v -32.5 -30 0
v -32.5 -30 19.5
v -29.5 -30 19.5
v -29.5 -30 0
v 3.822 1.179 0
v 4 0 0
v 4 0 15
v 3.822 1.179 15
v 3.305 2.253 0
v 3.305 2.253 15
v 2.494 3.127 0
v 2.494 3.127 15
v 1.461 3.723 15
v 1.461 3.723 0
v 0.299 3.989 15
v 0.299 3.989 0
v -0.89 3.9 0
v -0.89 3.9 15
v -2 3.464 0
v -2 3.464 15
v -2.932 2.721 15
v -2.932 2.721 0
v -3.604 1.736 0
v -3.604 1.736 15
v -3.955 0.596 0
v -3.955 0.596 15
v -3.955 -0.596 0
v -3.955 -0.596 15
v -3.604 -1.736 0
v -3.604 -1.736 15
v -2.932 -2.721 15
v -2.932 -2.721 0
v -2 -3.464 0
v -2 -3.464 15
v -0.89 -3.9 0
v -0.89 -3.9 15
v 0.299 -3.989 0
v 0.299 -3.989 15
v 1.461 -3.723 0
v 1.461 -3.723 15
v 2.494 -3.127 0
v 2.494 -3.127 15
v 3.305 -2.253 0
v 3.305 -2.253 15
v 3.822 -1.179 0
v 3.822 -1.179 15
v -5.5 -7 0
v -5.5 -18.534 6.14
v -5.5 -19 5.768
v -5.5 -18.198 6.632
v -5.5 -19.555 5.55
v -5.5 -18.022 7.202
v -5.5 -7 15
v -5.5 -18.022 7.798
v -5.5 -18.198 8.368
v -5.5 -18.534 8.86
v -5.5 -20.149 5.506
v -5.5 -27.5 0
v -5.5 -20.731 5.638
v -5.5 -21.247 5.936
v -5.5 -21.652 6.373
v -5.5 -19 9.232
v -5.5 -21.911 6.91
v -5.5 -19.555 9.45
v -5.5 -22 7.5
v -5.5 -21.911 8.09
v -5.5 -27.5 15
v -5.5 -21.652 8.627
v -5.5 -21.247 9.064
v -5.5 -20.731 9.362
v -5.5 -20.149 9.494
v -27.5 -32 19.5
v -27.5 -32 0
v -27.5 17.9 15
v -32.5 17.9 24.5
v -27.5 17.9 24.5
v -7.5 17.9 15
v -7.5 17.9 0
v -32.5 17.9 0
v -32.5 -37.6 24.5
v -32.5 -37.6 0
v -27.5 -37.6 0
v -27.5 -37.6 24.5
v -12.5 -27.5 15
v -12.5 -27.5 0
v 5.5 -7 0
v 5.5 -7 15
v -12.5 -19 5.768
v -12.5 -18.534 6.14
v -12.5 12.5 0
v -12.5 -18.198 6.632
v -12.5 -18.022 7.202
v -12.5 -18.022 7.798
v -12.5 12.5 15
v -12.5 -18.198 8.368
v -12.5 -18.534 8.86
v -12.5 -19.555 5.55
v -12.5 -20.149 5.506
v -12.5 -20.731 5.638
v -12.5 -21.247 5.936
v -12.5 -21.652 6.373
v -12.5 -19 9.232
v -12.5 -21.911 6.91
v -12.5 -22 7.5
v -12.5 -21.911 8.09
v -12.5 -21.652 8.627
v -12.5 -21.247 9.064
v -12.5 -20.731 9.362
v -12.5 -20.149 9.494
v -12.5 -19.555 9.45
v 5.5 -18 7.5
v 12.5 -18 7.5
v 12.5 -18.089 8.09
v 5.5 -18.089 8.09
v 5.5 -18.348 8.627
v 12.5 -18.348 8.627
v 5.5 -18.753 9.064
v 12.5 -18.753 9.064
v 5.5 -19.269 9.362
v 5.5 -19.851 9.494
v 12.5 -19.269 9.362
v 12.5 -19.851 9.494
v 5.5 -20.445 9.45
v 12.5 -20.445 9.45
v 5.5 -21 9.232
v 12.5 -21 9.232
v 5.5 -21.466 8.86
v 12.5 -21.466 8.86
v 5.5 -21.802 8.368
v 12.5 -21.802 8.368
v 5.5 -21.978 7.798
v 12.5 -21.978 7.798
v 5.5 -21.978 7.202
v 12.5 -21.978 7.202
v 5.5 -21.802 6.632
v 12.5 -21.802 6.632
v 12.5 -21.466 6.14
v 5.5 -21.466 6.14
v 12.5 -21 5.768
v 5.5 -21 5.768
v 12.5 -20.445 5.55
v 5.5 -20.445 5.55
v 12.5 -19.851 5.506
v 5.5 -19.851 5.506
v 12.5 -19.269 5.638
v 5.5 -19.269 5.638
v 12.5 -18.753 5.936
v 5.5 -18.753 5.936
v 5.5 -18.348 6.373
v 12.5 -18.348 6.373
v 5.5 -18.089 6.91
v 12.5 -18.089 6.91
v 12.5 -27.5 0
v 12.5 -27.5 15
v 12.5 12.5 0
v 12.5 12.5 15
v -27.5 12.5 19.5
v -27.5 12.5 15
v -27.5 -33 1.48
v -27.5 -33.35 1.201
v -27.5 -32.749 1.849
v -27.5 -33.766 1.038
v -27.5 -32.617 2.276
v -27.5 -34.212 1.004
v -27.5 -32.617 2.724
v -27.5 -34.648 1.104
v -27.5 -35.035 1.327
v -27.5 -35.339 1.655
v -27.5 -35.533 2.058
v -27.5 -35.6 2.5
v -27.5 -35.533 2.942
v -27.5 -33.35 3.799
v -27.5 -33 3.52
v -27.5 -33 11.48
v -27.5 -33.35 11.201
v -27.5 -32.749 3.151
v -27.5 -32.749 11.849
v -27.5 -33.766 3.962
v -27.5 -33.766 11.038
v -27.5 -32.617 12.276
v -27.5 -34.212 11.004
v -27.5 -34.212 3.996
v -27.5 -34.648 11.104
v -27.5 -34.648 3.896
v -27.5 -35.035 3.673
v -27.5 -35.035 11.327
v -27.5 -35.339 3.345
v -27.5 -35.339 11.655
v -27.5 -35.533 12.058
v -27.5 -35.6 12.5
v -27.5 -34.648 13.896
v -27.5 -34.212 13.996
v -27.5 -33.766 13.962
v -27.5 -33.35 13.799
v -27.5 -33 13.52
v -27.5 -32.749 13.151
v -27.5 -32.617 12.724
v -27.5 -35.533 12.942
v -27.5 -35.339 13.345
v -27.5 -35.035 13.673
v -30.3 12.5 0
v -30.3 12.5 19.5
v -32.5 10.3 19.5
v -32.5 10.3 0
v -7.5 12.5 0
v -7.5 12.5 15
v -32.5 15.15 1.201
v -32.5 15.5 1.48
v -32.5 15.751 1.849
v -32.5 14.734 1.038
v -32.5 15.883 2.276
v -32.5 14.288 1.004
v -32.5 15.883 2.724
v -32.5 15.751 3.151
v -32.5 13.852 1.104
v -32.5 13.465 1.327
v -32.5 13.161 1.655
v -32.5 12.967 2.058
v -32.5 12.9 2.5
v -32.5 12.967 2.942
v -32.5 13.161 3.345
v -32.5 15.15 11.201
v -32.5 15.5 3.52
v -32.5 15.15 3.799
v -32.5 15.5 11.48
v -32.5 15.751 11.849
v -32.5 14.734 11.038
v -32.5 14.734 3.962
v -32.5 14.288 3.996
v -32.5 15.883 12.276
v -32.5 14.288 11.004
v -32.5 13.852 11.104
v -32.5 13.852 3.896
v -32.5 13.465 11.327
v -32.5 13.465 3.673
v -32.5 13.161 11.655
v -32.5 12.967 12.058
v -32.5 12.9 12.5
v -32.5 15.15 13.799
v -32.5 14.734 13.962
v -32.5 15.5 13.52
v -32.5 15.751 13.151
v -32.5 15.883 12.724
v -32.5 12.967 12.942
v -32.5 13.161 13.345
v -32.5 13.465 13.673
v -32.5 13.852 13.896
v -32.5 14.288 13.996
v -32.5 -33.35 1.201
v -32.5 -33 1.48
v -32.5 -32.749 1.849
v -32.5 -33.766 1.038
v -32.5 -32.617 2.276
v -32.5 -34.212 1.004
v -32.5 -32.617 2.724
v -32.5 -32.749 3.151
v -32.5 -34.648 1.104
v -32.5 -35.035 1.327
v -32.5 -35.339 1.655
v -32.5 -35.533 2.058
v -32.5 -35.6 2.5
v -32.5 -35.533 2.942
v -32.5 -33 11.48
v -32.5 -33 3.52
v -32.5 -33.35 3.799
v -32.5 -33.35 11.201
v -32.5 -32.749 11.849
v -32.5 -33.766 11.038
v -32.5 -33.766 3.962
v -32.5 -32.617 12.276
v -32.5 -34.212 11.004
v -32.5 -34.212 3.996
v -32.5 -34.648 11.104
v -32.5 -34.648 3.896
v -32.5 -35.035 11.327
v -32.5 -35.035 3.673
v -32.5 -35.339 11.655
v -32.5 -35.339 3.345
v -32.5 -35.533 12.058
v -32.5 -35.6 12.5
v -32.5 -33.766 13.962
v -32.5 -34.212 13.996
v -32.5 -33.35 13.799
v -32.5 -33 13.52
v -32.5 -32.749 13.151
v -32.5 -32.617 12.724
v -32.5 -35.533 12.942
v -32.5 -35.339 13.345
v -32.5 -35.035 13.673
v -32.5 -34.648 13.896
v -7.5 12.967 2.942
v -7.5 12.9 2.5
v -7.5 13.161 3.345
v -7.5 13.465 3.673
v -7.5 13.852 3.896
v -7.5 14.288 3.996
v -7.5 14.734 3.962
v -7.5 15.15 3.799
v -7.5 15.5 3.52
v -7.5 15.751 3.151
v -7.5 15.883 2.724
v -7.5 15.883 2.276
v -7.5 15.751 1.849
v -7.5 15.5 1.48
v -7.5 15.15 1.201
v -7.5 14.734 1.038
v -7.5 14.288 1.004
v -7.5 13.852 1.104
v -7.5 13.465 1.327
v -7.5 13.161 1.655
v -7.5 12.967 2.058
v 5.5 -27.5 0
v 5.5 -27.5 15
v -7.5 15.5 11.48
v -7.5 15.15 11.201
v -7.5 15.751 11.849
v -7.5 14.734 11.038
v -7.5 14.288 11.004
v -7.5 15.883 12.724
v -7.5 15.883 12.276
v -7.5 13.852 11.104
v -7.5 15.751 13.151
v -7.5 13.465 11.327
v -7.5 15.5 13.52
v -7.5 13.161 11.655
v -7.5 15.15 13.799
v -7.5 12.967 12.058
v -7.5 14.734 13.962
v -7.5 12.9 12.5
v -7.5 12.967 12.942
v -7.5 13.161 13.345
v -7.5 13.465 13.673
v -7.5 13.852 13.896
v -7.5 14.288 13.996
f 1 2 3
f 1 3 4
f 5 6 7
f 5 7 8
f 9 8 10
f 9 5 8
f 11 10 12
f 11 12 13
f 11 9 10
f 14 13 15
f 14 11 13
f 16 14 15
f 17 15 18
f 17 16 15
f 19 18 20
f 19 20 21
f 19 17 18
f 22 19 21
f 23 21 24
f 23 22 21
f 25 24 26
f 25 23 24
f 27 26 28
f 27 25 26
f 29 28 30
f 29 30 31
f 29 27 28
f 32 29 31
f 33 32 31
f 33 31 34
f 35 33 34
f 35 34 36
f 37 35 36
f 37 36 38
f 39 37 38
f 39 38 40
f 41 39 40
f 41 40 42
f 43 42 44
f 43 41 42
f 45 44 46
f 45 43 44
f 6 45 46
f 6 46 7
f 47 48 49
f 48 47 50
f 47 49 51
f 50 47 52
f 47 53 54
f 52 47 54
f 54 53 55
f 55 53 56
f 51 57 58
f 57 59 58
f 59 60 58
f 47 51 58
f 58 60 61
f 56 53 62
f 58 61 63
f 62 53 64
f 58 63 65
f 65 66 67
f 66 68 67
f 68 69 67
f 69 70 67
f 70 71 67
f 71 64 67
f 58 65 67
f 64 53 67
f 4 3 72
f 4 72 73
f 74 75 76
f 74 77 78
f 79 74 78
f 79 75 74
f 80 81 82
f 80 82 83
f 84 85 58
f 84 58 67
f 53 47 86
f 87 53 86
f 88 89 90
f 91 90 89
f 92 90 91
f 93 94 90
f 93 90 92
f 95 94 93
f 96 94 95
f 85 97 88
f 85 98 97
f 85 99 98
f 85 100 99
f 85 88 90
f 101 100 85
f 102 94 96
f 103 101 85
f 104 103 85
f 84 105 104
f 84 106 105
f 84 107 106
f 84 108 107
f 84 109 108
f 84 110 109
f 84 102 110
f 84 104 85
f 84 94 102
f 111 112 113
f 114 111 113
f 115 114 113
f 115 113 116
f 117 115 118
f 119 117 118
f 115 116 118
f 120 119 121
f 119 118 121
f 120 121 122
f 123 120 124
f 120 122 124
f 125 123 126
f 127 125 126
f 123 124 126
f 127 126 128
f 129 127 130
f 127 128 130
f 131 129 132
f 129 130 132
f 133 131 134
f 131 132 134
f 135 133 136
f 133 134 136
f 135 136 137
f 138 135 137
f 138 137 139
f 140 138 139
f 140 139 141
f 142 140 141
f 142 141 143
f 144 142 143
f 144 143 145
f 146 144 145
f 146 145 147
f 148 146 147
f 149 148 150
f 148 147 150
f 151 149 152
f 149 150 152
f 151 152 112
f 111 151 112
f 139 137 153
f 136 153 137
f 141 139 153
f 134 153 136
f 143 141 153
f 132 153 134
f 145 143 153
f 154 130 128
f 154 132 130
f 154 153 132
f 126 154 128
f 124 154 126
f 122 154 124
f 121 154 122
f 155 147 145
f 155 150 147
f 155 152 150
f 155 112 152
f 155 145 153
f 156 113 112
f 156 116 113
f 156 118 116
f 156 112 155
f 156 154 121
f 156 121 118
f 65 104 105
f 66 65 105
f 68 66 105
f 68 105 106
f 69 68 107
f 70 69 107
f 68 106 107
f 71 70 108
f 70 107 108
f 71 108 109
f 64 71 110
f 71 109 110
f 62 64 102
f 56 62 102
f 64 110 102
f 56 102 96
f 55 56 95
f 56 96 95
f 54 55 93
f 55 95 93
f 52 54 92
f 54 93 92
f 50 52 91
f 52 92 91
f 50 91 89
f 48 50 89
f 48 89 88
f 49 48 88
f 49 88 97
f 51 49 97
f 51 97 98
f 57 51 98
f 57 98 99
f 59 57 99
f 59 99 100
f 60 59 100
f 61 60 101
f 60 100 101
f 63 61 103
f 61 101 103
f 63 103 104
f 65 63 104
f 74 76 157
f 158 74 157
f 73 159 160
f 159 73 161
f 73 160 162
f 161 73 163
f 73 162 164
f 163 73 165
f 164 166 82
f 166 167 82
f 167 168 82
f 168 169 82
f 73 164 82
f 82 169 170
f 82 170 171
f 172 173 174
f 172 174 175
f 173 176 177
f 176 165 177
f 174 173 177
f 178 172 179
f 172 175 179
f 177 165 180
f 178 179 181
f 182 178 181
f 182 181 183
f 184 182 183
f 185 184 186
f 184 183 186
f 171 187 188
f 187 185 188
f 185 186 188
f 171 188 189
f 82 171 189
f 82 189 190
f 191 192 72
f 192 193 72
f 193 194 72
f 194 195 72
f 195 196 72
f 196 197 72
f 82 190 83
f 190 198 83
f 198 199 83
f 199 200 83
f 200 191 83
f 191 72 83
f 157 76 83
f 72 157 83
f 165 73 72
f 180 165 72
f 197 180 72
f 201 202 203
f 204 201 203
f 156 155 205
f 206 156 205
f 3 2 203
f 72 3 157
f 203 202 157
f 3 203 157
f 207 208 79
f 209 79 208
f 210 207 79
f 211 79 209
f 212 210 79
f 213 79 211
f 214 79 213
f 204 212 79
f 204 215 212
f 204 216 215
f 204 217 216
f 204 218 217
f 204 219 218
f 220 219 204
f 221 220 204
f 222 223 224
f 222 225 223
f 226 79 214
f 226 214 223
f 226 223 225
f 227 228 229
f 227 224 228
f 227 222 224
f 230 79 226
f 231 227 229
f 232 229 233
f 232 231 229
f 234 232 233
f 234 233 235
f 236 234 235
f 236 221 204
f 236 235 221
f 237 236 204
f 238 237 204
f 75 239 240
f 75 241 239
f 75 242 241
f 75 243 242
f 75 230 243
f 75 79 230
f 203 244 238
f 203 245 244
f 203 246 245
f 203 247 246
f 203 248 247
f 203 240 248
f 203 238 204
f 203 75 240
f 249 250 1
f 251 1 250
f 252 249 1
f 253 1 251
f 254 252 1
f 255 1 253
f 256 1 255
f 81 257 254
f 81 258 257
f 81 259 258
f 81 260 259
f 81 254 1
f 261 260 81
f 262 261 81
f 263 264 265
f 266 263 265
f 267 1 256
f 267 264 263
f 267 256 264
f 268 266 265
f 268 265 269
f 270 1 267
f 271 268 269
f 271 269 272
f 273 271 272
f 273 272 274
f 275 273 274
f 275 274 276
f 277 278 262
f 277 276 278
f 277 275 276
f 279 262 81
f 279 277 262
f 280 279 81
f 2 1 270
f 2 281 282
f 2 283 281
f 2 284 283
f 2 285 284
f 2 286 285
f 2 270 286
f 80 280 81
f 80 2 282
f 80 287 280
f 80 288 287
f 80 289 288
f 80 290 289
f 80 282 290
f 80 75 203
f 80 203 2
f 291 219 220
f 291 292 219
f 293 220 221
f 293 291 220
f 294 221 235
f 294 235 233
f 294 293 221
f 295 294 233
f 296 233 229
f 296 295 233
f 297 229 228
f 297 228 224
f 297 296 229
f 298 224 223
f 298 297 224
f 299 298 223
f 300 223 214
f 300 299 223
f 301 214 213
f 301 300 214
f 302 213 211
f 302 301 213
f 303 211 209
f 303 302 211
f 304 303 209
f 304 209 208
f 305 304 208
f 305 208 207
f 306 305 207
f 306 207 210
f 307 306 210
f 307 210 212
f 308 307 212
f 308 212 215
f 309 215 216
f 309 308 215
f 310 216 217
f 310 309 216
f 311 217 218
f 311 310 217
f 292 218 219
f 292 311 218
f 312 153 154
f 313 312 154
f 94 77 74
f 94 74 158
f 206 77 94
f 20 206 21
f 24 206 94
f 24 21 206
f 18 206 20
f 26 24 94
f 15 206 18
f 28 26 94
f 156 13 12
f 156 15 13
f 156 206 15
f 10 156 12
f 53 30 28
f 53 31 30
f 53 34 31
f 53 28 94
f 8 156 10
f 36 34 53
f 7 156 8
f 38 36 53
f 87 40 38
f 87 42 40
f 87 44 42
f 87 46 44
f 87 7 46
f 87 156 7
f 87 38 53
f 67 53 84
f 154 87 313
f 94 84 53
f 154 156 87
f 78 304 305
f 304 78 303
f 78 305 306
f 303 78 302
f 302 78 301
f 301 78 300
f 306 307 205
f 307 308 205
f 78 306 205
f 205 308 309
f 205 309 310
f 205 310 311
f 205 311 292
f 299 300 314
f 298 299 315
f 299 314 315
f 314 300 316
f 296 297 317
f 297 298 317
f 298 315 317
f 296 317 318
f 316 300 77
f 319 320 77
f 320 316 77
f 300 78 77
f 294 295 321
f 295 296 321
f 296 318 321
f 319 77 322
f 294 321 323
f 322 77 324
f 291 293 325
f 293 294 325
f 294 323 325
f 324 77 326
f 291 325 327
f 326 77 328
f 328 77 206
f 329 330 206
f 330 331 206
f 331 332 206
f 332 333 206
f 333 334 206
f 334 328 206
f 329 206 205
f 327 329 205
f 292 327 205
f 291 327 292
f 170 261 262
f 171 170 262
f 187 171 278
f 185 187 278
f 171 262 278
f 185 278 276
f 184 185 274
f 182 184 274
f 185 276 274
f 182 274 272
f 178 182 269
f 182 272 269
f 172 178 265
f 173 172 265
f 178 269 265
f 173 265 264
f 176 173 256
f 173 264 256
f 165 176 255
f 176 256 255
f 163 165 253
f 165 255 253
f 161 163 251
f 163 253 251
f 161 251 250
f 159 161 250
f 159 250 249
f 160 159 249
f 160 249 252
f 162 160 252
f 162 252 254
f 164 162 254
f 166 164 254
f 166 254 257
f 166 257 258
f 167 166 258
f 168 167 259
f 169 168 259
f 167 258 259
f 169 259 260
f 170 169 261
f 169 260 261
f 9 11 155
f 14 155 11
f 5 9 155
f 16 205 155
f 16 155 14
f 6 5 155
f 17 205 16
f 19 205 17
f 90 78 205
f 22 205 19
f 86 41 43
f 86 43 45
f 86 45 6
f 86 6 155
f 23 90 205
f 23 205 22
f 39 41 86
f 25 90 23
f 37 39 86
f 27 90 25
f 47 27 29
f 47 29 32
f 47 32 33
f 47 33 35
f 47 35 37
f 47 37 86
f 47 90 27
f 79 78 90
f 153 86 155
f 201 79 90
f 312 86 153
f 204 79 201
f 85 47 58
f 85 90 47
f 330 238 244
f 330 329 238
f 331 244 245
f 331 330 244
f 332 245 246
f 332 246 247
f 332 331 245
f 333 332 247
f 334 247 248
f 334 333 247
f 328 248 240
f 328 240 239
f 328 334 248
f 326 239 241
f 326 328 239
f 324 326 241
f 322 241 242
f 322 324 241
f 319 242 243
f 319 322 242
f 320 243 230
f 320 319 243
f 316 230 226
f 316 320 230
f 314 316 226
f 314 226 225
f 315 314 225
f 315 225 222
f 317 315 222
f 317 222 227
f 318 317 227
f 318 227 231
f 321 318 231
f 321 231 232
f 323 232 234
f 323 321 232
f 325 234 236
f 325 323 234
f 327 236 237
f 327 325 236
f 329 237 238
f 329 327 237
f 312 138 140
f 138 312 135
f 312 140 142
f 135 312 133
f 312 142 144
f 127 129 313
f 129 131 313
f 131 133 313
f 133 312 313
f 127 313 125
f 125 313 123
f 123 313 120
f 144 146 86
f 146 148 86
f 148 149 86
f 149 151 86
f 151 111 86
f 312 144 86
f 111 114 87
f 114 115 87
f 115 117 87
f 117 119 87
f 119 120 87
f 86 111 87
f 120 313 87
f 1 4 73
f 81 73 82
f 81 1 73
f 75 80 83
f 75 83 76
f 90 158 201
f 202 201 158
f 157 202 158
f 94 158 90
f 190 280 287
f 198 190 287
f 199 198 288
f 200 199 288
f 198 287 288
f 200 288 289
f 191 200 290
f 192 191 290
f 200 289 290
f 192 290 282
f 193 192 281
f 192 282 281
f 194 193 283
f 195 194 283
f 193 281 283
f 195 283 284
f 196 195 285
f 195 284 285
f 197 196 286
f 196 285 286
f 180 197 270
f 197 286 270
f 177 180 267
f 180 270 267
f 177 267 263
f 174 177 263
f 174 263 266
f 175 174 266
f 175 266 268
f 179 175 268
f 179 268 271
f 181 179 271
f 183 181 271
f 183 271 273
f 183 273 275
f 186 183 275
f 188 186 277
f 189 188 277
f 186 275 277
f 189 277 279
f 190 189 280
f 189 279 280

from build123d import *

# Parameters (mm, degrees)
F0_R         = 4
F1_DEPTH     = 15
F3_W         = 15
F3_H         = 15
F3_R         = 2
F4_DEPTH     = 7
F6_W         = 15
F6_H         = 15
F6_R         = 2
F7_DEPTH     = 7
F8_W         = 5.4
F8_H         = 15
F8_R         = 1.5
F9_DEPTH     = 5
F10_DEPTH    = 20
F12_W        = 5.4
F12_H        = 2.5
F12_W_2      = 7.6
F12_H_2      = 15
F12_R        = 1.5
F13_DEPTH    = 5
F12_W_3      = 2.2
F12_H_3      = 2
F14_DEPTH    = 3
F15_T4_DEPTH = 27.2150489639
F16_SIZE     = 2


# Not quite as in the source:
# - a fillet or chamfer that OpenCascade refuses, or shapes differently, is made with other operations: its cross-section is extruded or revolved along the edge and cut away or added


with BuildPart() as f1:
    # F0 (on Top) → F1 (new body)
    with BuildSketch(Plane.XY):
        Polygon((12.5, -12.5), (12.5, 12.5), (-12.5, 12.5), (-12.5, -12.5), (-5.5, -12.5), (-5.5, -7), (5.5, -7), (5.5, -12.5), align=None)
        Circle(F0_R, mode=Mode.SUBTRACT)
    extrude(amount=F1_DEPTH)

    # F3 (on offset) → F4 (join)
    with BuildSketch(Plane(origin=(-12.5, 0, 0), x_dir=(0, -1, 0), z_dir=(-1, 0, 0))):
        with Locations((20, 7.5)):
            Rectangle(F3_W, F3_H)
        with Locations((20, 7.5)):
            Circle(F3_R, mode=Mode.SUBTRACT)
    extrude(amount=-F4_DEPTH)

    # F6 (on offset) → F7 (join)
    with BuildSketch(Plane.YZ.offset(12.5)):
        with Locations((-20, 7.5)):
            Rectangle(F6_W, F6_H)
        with Locations((-20, 7.5)):
            Circle(F6_R, mode=Mode.SUBTRACT)
    extrude(amount=-F7_DEPTH)

    # F8 (on offset) → F9 (join)
    with BuildSketch(Plane(origin=(-12.5, 0, 0), x_dir=(0, -1, 0), z_dir=(-1, 0, 0))):
        with Locations((-15.2, 7.5)):
            Rectangle(F8_W, F8_H)
        with Locations((-14.4, 2.5)):
            Circle(F8_R, mode=Mode.SUBTRACT)
        with Locations((-14.4, 12.5)):
            Circle(F8_R, mode=Mode.SUBTRACT)
    extrude(amount=-F9_DEPTH)

    # F8 (on offset) → F10 (join)
    with BuildSketch(Plane(origin=(-12.5, 0, 0), x_dir=(0, -1, 0), z_dir=(-1, 0, 0))):
        with Locations((-15.2, 7.5)):
            Rectangle(F8_W, F8_H)
        with Locations((-14.4, 2.5)):
            Circle(F8_R, mode=Mode.SUBTRACT)
        with Locations((-14.4, 12.5)):
            Circle(F8_R, mode=Mode.SUBTRACT)
    extrude(amount=F10_DEPTH)

    # F12 (on offset) → F13 (join)
    with BuildSketch(Plane(origin=(-32.5, 0, 0), x_dir=(0, -1, 0), z_dir=(-1, 0, 0))):
        with Locations((-15.2, 16.25)):
            Rectangle(F12_W, F12_H)
        Polygon((30, 19.5), (30, 17.5), (37.6, 17.5), (37.6, 24.5), (-17.9, 24.5), (-17.9, 17.5), (-12.5, 17.5), (-12.5, 19.5), (-10.3, 19.5), align=None)
        with Locations((33.8, 16.25)):
            Rectangle(F12_W_2, F12_H)
        with Locations((33.8, 7.5)):
            Rectangle(F12_W_2, F12_H_2)
        with Locations((34.1, 2.5)):
            Circle(F12_R, mode=Mode.SUBTRACT)
        with Locations((34.1, 12.5)):
            Circle(F12_R, mode=Mode.SUBTRACT)
    extrude(amount=-F13_DEPTH)

    # F12 (on offset) → F14 (join)
    with BuildSketch(Plane(origin=(-32.5, 0, 0), x_dir=(0, -1, 0), z_dir=(-1, 0, 0))):
        with Locations((-11.4, 7.5)):
            Rectangle(F12_W_3, F12_H_2)
        with Locations((-11.4, 16.25)):
            Rectangle(F12_W_3, F12_H)
        with Locations((-11.4, 18.5)):
            Rectangle(F12_W_3, F12_H_3)
    extrude(amount=-F14_DEPTH)

    # F15: chamfer of 3 on 1 edges, made by hand


with BuildPart() as f15_tool2:
    # F15_s3 → F15_t4 (new body)
    with BuildSketch(Plane.XY.offset(-7.7150489639)):
        Polygon((-29.5, 13.3), (-32.5, 10.3), (-29.5, 10.3), align=None)
    extrude(amount=F15_T4_DEPTH)

    split(bisect_by=Plane.XZ.offset(-12.5), keep=Keep.TOP)


with BuildPart() as f1_1:
    add(f1.part)

    # F15_t1: cut F15_tool2
    add(f15_tool2.part, mode=Mode.SUBTRACT)

    # F16
    f16_edges = [f1_1.edges().sort_by_distance(p)[0] for p in [
        (-27.5, -30, 9.75),
    ]]
    chamfer(f16_edges, length=F16_SIZE)


solid = f1_1.part
